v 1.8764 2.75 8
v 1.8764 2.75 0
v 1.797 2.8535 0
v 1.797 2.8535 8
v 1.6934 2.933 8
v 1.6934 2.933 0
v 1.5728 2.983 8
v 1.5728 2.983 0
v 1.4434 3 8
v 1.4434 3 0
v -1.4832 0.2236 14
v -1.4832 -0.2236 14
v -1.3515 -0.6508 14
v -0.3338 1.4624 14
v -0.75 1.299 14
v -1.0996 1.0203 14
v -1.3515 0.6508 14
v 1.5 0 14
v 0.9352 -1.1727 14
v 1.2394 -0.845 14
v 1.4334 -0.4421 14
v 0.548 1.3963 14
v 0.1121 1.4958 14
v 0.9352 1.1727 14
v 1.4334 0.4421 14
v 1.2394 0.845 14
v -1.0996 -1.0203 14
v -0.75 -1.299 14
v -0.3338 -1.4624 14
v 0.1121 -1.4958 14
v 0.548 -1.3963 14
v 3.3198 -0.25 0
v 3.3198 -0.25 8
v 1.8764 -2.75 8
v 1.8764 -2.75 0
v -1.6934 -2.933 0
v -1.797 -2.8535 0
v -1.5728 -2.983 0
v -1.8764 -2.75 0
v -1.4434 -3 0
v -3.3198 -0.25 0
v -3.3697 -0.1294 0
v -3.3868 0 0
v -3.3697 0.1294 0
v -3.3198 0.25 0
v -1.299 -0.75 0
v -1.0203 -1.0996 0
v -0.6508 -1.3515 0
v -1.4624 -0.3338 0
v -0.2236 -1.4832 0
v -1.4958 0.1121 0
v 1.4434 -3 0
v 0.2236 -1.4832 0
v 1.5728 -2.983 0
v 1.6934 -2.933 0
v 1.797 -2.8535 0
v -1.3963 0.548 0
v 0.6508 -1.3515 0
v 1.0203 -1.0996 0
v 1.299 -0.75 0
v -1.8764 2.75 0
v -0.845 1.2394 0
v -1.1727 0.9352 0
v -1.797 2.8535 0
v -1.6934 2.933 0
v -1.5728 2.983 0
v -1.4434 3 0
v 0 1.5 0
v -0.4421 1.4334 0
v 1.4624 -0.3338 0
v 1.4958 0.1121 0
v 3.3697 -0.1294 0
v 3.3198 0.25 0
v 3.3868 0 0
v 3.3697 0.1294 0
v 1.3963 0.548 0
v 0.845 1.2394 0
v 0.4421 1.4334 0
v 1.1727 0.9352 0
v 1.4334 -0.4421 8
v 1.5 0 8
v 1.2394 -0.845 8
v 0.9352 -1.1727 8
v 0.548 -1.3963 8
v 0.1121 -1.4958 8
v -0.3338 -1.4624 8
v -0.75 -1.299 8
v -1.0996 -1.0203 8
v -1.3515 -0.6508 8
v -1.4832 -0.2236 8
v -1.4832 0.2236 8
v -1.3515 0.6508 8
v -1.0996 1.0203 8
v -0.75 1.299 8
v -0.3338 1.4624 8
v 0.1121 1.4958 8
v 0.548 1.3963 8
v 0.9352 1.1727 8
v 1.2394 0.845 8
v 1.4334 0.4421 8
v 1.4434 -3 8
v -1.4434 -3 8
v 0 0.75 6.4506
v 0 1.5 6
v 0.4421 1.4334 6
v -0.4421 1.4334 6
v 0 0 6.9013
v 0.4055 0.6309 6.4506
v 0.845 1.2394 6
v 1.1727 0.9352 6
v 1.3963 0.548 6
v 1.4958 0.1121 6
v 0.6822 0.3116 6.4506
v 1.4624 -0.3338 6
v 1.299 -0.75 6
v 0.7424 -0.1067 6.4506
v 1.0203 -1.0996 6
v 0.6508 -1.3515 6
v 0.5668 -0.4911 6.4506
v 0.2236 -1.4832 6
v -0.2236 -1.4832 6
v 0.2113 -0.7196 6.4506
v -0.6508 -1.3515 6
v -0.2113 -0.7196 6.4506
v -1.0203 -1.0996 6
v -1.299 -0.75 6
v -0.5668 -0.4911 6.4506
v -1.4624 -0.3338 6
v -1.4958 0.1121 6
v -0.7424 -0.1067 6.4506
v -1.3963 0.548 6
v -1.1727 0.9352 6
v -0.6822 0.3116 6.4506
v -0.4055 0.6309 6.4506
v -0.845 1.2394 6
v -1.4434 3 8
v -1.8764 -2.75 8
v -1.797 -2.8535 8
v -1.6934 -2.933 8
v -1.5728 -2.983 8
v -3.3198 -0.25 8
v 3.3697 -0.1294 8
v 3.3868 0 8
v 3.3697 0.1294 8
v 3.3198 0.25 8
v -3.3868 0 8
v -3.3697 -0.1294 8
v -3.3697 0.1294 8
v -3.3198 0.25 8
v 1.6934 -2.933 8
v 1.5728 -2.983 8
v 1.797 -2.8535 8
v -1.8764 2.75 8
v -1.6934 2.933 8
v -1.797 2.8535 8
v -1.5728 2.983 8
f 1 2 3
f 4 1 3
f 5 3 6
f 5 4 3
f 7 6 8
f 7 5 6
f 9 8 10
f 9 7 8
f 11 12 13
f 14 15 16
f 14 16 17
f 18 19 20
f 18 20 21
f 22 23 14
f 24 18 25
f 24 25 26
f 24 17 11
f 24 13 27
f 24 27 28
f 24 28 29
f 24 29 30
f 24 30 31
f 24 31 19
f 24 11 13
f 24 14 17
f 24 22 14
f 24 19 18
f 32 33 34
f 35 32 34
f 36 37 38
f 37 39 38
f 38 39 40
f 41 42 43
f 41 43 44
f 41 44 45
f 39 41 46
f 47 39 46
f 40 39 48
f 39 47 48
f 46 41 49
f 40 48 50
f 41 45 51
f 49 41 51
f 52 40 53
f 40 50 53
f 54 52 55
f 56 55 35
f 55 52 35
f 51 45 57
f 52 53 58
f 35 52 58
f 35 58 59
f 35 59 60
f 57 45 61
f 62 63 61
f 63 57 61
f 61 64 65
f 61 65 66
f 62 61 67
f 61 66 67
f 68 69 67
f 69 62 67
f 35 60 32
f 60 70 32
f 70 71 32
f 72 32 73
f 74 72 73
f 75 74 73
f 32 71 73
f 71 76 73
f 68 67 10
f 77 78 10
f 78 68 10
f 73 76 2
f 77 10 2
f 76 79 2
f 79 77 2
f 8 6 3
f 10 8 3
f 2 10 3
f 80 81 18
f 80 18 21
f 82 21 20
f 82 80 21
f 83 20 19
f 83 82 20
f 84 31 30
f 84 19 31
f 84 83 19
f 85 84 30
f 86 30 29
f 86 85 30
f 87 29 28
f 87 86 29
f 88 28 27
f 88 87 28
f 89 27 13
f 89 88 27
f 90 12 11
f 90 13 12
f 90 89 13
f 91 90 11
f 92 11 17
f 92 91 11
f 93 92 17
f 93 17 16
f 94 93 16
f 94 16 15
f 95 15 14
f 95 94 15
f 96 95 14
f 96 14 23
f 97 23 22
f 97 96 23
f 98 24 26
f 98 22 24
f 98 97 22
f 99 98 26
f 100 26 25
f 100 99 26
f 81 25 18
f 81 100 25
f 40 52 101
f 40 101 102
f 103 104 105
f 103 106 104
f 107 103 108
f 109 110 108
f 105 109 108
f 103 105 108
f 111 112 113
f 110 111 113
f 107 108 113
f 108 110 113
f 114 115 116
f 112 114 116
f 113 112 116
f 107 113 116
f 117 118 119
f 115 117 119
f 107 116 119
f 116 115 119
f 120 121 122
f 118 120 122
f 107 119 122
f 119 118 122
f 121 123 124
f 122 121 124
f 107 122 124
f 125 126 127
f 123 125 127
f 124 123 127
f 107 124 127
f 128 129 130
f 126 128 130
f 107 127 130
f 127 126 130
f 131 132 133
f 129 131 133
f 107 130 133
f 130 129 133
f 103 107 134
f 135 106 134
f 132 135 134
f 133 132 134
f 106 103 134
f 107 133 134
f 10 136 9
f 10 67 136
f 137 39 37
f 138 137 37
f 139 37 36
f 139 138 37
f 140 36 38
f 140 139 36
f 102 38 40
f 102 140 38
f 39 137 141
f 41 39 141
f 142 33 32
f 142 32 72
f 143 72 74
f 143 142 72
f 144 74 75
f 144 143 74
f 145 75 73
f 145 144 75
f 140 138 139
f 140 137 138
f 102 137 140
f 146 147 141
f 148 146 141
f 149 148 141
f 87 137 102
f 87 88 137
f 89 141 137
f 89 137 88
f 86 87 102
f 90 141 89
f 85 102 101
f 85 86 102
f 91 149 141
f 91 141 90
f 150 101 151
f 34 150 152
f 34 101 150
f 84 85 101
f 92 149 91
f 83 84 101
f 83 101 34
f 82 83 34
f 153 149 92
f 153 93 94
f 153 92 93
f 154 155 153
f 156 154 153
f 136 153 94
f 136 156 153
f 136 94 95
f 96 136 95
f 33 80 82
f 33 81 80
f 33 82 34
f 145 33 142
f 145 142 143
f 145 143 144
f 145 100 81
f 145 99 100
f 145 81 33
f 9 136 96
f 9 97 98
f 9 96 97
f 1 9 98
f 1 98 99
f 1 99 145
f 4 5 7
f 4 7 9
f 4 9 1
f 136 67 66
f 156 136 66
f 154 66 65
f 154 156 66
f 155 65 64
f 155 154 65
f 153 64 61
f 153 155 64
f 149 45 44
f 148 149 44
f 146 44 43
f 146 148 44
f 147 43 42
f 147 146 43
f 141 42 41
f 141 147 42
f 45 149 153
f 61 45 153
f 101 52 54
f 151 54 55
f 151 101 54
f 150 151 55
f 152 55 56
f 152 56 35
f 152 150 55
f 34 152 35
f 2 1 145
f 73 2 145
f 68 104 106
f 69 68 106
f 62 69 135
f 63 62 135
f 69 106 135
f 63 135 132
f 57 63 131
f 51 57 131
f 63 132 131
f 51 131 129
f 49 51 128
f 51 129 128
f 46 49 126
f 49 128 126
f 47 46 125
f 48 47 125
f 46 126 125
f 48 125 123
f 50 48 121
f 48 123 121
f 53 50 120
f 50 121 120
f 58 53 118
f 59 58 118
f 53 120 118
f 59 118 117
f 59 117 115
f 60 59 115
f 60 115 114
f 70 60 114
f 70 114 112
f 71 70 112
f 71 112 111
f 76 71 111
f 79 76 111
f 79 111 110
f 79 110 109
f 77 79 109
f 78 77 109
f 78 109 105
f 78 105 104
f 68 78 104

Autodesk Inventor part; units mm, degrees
ref_plane "YZ Plane" through (0, 0, 0) normal (1, 0, 0) x (0, 1, 0)
ref_plane "XZ Plane" through (0, 0, 0) normal (0, 1, 0) x (-1, 0, 0)
ref_plane "XY Plane" through (0, 0, 0) normal (0, 0, 1) x (1, 0, 0)
sketch "スケッチ1" plane through (0, 0, 0) normal (0, 0, 1) x (1, 0, 0)
  line L0 (1.7321, -3) -> (-1.7321, -3)
  line L1 (-1.7321, -3) -> (-3.4641, 0)
  line L2 (-3.4641, 0) -> (-1.7321, 3)
  line L3 (-1.7321, 3) -> (1.7321, 3)
  line L4 (1.7321, 3) -> (3.4641, 0)
  line L5 (3.4641, 0) -> (1.7321, -3)
  point P0 (0, 0)
  point P1 (0, 0)
  dimension "d5" = 6
  dimension "d6" = 3
extrude "押し出し1" add sketch "スケッチ1" along normal blind 8
sketch "スケッチ2" plane through (0, 0, 8) normal (0, 0, 1) x (1, 0, 0)
  circle A0 centre (0, 0) radius 1.5
  dimension "d10" = 3
extrude "押し出し2" add sketch "スケッチ2" along normal blind 6
sketch "スケッチ3" plane through (0, 0, 0) normal (0, 0, -1) x (-1, 0, 0)
  circle A0 centre (0, 0) radius 1.5
  dimension "d13" = 3
hole "穴1" at (0, 0, 0) direction (0, 0, 1) diameter 3 depth 6 tip angle 118
thread "ねじ1" size "M3x0.5" class "6g" standard "ANSI Metric M Profile" full length
thread "ねじ2" size "M3x0.5" class "6H" standard "ANSI Metric M Profile" full length
fillet "フィレット1" radius 0.5 6 edges at (-3.4641, 0, 4) (-1.7321, -3, 4) (-1.7321, 3, 4) (1.7321, 3, 4) (3.4641, 0, 4) (1.7321, -3, 4)
